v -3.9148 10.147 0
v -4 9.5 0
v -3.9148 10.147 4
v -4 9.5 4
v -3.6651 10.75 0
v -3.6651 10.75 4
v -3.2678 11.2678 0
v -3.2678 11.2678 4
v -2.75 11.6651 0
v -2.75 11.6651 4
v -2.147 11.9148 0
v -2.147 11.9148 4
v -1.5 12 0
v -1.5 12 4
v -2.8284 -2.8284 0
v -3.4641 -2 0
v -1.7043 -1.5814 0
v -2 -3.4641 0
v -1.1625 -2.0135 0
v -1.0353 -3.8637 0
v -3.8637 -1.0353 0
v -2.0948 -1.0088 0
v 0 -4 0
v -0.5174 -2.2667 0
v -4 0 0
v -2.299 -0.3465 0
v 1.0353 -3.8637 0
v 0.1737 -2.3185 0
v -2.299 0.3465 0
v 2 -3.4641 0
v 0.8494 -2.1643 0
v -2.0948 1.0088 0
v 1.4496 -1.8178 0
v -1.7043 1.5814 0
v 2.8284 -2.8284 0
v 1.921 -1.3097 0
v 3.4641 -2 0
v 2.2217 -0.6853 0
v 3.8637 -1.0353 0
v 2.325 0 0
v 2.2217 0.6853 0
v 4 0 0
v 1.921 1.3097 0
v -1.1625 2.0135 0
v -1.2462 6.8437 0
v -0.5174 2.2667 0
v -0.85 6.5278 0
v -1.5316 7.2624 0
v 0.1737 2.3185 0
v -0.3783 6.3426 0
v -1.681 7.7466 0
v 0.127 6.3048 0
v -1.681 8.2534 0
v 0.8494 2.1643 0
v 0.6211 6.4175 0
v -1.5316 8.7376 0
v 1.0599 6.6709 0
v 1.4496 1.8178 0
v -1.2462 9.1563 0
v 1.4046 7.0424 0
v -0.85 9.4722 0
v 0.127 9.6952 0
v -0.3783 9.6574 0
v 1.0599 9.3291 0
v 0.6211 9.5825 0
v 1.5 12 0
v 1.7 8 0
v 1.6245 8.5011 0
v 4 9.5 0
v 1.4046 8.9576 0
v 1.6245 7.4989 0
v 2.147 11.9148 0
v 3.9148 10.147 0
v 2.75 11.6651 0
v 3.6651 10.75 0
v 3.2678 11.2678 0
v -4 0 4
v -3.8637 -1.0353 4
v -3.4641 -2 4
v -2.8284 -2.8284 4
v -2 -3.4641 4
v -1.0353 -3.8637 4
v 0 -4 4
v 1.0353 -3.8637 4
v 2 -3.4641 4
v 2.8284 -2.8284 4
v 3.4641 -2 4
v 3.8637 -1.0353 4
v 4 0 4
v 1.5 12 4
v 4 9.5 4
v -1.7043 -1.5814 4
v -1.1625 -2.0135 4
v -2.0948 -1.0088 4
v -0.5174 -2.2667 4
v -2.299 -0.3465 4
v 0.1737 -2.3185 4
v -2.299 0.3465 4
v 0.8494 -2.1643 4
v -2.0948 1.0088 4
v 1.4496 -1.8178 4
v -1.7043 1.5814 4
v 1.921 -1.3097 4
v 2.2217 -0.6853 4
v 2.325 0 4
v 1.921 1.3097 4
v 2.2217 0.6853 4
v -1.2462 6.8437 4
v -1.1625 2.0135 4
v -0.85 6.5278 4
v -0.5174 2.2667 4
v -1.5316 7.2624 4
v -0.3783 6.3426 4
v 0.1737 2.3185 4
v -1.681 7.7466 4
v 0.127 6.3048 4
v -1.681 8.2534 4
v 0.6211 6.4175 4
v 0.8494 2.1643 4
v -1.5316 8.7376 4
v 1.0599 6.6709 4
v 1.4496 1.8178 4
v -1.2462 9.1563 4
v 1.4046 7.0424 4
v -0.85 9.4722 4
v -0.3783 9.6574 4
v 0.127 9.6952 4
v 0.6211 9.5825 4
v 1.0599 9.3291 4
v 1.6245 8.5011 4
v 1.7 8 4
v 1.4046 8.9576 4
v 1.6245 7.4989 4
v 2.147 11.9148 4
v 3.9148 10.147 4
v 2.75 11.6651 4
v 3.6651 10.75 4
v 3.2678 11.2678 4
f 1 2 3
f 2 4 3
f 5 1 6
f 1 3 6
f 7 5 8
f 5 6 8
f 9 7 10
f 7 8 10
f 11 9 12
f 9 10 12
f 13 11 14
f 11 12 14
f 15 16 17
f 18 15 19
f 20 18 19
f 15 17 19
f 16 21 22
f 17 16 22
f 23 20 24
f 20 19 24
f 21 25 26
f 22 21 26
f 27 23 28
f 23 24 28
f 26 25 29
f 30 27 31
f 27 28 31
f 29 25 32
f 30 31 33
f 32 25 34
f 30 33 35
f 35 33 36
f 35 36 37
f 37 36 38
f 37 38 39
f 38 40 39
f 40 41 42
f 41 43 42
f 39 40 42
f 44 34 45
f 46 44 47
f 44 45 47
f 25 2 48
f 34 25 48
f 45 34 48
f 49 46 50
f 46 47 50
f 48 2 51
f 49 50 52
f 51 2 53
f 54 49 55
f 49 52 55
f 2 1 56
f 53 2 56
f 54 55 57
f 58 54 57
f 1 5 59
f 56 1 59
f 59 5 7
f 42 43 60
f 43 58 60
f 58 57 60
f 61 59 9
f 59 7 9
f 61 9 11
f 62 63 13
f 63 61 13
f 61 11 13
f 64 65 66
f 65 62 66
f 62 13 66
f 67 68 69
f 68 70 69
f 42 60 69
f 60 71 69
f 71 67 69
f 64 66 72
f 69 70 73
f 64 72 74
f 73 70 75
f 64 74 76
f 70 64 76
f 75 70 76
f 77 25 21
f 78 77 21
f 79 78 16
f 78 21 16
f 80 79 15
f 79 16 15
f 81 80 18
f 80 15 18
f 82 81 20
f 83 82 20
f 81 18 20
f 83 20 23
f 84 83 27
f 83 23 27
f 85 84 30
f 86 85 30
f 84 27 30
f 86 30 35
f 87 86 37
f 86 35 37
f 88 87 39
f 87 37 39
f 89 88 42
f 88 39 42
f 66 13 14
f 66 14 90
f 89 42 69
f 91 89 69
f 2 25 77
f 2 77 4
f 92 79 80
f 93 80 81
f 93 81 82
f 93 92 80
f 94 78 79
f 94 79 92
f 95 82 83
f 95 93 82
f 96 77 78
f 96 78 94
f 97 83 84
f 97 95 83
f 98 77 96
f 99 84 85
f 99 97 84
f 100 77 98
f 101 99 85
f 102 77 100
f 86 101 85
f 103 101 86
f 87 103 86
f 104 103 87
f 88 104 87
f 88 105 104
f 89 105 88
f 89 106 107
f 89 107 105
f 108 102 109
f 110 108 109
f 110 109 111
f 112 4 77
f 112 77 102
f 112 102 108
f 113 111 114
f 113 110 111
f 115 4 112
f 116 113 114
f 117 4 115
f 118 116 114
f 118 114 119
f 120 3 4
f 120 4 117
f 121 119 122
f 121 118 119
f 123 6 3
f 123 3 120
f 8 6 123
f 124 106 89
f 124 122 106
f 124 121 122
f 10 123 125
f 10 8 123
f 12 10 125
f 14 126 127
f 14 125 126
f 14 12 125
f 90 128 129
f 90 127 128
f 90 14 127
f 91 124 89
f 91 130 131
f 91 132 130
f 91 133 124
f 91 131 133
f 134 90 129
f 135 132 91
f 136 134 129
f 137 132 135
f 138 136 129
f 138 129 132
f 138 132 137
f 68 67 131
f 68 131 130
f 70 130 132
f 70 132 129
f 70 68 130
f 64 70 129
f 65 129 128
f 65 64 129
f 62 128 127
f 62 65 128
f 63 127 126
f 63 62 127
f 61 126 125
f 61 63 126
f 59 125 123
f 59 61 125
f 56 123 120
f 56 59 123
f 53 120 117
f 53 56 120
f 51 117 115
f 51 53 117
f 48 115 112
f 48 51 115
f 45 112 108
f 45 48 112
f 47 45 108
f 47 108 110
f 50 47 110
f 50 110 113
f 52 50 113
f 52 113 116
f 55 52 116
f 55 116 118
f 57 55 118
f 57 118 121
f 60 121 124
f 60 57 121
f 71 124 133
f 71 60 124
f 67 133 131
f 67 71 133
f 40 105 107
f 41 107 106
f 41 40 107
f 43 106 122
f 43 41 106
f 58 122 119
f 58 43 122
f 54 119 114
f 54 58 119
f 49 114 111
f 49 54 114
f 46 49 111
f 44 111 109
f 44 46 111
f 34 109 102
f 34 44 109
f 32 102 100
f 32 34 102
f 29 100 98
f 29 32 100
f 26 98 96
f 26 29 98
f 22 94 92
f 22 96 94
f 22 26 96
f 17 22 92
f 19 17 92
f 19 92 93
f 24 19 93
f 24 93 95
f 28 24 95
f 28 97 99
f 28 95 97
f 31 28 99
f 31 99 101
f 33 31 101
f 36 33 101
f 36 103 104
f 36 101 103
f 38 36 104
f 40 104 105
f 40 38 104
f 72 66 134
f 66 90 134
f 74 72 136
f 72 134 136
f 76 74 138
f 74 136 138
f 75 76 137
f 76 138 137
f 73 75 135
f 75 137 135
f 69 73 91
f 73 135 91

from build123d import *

# Parameters (mm, degrees)
SKETCH1_R           = 4
BOSS_EXTRUDE1_DEPTH = 4
SKETCH3_W           = 8
SKETCH3_H           = 12
BOSS_EXTRUDE2_DEPTH = 4
SKETCH2_R           = 2.325
CUT_EXTRUDE2_DEPTH  = 5
SKETCH4_R           = 1.7
CUT_EXTRUDE3_DEPTH  = 4
FILLET1_R           = 2.5


with BuildPart() as part:
    # Sketch1 → Boss-Extrude1 (new body)
    with BuildSketch(Plane.XY):
        Circle(SKETCH1_R)
    extrude(amount=BOSS_EXTRUDE1_DEPTH)

    # Sketch3 → Boss-Extrude2 (add)
    with BuildSketch(Plane.XY):
        with Locations((0, 6)):
            Rectangle(SKETCH3_W, SKETCH3_H)
    extrude(amount=BOSS_EXTRUDE2_DEPTH)

    # Sketch2 → Cut-Extrude2 (cut, through all)
    with BuildSketch(Plane.XY):
        Circle(SKETCH2_R)
    extrude(amount=CUT_EXTRUDE2_DEPTH, mode=Mode.SUBTRACT)

    # Sketch4 → Cut-Extrude3 (cut)
    with BuildSketch(Plane.XY):
        with Locations((0, 8)):
            Circle(SKETCH4_R)
    extrude(amount=CUT_EXTRUDE3_DEPTH, mode=Mode.SUBTRACT)

    # Fillet1
    fillet1_edges = [part.edges().sort_by_distance(p)[0] for p in [
        (4, 12, 2),
        (-4, 12, 2),
    ]]
    fillet(fillet1_edges, radius=FILLET1_R)


solid = part.part
